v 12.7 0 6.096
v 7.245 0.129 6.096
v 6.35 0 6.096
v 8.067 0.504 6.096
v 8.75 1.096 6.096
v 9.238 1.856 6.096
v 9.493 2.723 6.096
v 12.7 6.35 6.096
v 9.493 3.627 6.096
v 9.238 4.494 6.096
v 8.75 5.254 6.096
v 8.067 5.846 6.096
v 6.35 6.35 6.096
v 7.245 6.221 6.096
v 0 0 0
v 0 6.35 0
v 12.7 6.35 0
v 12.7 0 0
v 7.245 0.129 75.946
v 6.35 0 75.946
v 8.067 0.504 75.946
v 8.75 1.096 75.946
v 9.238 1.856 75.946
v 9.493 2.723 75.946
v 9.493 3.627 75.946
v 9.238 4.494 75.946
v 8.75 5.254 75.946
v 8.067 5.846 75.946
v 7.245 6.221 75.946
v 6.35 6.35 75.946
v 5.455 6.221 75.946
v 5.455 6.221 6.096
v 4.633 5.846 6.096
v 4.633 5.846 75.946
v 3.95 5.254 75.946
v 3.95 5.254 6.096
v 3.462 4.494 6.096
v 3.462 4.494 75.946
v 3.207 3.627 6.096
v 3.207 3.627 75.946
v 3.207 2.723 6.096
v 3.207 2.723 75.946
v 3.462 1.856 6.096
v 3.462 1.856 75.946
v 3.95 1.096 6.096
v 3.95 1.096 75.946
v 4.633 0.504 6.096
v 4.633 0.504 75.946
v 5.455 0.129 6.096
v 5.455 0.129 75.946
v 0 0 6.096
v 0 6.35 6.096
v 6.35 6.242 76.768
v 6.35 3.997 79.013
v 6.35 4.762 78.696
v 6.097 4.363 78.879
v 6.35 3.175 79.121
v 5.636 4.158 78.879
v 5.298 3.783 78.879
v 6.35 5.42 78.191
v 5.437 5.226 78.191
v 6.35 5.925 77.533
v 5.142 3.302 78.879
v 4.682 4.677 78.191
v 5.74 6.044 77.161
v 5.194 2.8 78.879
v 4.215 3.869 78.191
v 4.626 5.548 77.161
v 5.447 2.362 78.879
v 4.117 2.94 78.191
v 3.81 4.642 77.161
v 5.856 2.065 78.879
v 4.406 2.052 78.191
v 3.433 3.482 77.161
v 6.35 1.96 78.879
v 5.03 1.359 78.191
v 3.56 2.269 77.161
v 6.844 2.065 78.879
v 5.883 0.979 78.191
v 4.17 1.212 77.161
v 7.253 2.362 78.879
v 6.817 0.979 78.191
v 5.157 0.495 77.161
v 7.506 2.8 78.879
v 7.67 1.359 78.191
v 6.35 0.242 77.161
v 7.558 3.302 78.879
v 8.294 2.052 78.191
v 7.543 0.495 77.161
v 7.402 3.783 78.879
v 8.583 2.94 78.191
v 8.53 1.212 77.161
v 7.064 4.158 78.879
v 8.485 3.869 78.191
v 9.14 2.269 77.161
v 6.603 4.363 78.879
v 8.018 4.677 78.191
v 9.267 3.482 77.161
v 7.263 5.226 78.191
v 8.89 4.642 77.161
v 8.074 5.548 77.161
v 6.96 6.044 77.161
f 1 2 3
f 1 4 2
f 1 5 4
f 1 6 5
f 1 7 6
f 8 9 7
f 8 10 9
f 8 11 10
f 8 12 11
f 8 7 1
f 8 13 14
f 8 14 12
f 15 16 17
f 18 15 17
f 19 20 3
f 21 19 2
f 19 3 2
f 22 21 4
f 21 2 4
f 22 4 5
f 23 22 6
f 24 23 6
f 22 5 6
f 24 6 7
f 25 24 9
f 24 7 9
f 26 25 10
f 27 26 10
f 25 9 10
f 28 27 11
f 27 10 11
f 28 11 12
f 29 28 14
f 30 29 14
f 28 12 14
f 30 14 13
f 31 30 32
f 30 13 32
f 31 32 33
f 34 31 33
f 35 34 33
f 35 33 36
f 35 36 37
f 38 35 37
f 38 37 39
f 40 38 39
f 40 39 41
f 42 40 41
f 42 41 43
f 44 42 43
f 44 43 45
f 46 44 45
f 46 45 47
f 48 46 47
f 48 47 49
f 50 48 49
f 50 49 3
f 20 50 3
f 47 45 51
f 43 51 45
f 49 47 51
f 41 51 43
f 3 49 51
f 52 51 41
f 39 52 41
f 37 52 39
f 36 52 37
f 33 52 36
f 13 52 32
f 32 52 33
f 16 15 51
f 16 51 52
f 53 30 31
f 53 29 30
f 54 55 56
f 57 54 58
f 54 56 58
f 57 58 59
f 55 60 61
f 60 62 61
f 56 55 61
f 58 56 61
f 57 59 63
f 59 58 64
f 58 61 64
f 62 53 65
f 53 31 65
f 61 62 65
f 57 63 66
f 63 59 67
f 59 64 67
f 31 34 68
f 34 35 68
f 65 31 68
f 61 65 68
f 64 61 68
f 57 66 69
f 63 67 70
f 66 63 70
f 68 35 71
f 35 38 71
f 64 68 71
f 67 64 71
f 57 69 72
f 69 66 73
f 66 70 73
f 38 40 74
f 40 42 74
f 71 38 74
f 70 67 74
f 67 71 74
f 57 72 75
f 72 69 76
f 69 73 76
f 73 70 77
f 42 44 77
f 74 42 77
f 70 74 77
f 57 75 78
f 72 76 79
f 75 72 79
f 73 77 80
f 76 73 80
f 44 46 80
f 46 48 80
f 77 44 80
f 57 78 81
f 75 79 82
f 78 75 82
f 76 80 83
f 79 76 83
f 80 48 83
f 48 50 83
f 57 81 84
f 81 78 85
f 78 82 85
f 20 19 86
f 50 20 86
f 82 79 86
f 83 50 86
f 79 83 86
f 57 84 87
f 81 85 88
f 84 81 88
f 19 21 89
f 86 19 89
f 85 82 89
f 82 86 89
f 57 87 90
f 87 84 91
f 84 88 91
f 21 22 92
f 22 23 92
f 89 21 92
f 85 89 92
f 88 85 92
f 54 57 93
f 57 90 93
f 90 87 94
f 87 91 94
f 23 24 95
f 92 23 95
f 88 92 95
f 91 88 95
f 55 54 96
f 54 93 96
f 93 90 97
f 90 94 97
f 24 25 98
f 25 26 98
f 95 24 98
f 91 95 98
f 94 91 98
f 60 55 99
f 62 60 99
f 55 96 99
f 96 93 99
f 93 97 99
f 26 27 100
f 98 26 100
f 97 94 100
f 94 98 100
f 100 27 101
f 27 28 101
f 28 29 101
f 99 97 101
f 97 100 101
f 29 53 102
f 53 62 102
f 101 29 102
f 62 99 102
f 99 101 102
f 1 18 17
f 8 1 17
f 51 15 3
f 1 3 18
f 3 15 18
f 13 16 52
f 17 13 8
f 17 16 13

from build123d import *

# Parameters (mm, degrees)
SKETCH1_W           = 12.7
SKETCH1_H           = 6.35
BOSS_EXTRUDE1_DEPTH = 6.096
SKETCH2_R           = 3.175
BOSS_EXTRUDE2_DEPTH = 69.85


with BuildPart() as part:
    # Sketch1 → Boss-Extrude1 (new body)
    with BuildSketch(Plane.XY):
        with Locations((6.35, 3.175)):
            Rectangle(SKETCH1_W, SKETCH1_H)
    extrude(amount=BOSS_EXTRUDE1_DEPTH)

    # Sketch2 → Boss-Extrude2 (add)
    with BuildSketch(Plane.XY.offset(6.096)):
        with Locations(Location((6.35, 3.175, 0), (0, 0, 270))):
            Circle(SKETCH2_R)
    extrude(amount=BOSS_EXTRUDE2_DEPTH)

    # Sketch4 → Revolve1 (revolve)
    with BuildSketch(Plane(origin=(6.35, 0, 0), x_dir=(0, 0, -1), z_dir=(1, 0, 0))):
        with BuildLine():
            Line((-75.946, 6.35), (-75.946, 3.175))
            Line((-75.946, 3.175), (-79.121, 3.175))
            ThreePointArc((-79.121, 3.175), (-78.19106403, 5.42006403), (-75.946, 6.35))
        make_face()
    revolve(axis=Axis((6.35, 3.175, -3.95605), (0, 0, 1)))


solid = part.part
